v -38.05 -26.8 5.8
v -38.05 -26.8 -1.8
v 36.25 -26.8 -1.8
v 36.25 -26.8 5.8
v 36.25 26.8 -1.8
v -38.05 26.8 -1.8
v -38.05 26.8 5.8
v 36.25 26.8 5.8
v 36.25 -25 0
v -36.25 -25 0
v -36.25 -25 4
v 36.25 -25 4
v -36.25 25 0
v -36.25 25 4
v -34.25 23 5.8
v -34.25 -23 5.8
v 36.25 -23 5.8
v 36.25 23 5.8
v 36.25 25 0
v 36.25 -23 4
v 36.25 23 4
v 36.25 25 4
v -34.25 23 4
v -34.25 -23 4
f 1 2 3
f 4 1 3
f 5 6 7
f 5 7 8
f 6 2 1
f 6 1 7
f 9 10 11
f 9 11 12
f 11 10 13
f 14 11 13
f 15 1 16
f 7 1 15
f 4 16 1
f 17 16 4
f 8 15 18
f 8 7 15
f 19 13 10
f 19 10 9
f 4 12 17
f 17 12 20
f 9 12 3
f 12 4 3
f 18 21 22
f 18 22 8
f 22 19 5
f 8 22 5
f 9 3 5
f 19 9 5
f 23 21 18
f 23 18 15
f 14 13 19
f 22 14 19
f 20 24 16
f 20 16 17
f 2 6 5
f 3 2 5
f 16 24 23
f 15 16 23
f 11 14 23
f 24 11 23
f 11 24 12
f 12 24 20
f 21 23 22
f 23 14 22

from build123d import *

# Parameters (mm, degrees)
SKETCH_1_W               = 72.5
SKETCH_1_H               = 50
EXTRUDE_1_DEPTH          = 4
SHELL_1_T                = 1.8
CUT_EXTRUDE_1_DEPTH      = 48.157210477
CUT_EXTRUDE_1_DEPTH_BACK = 4


with BuildPart() as part:
    # 草图1 → 凸台-拉伸1 (new body)
    with BuildSketch(Plane.XY):
        Rectangle(SKETCH_1_W, SKETCH_1_H)
    extrude(amount=EXTRUDE_1_DEPTH)

    # 抽壳1
    shell_1_openings = [part.faces().sort_by_distance(p)[0] for p in [
        (36.25, 0, 2),
    ]]
    offset(amount=SHELL_1_T, openings=shell_1_openings, kind=Kind.INTERSECTION)

    # 草图2 → 切除-拉伸1 (cut, two sides: drawn at the far end of the back side and taken through both)
    with BuildSketch(Plane.XY.offset(5.8).offset(-CUT_EXTRUDE_1_DEPTH_BACK)):
        Polygon((34.25, 23), (36.25, 23), (36.25, -23), (34.25, -23), (-34.25, -23), (-34.25, 23), align=None)
    extrude(amount=CUT_EXTRUDE_1_DEPTH + CUT_EXTRUDE_1_DEPTH_BACK, mode=Mode.SUBTRACT)


solid = part.part
